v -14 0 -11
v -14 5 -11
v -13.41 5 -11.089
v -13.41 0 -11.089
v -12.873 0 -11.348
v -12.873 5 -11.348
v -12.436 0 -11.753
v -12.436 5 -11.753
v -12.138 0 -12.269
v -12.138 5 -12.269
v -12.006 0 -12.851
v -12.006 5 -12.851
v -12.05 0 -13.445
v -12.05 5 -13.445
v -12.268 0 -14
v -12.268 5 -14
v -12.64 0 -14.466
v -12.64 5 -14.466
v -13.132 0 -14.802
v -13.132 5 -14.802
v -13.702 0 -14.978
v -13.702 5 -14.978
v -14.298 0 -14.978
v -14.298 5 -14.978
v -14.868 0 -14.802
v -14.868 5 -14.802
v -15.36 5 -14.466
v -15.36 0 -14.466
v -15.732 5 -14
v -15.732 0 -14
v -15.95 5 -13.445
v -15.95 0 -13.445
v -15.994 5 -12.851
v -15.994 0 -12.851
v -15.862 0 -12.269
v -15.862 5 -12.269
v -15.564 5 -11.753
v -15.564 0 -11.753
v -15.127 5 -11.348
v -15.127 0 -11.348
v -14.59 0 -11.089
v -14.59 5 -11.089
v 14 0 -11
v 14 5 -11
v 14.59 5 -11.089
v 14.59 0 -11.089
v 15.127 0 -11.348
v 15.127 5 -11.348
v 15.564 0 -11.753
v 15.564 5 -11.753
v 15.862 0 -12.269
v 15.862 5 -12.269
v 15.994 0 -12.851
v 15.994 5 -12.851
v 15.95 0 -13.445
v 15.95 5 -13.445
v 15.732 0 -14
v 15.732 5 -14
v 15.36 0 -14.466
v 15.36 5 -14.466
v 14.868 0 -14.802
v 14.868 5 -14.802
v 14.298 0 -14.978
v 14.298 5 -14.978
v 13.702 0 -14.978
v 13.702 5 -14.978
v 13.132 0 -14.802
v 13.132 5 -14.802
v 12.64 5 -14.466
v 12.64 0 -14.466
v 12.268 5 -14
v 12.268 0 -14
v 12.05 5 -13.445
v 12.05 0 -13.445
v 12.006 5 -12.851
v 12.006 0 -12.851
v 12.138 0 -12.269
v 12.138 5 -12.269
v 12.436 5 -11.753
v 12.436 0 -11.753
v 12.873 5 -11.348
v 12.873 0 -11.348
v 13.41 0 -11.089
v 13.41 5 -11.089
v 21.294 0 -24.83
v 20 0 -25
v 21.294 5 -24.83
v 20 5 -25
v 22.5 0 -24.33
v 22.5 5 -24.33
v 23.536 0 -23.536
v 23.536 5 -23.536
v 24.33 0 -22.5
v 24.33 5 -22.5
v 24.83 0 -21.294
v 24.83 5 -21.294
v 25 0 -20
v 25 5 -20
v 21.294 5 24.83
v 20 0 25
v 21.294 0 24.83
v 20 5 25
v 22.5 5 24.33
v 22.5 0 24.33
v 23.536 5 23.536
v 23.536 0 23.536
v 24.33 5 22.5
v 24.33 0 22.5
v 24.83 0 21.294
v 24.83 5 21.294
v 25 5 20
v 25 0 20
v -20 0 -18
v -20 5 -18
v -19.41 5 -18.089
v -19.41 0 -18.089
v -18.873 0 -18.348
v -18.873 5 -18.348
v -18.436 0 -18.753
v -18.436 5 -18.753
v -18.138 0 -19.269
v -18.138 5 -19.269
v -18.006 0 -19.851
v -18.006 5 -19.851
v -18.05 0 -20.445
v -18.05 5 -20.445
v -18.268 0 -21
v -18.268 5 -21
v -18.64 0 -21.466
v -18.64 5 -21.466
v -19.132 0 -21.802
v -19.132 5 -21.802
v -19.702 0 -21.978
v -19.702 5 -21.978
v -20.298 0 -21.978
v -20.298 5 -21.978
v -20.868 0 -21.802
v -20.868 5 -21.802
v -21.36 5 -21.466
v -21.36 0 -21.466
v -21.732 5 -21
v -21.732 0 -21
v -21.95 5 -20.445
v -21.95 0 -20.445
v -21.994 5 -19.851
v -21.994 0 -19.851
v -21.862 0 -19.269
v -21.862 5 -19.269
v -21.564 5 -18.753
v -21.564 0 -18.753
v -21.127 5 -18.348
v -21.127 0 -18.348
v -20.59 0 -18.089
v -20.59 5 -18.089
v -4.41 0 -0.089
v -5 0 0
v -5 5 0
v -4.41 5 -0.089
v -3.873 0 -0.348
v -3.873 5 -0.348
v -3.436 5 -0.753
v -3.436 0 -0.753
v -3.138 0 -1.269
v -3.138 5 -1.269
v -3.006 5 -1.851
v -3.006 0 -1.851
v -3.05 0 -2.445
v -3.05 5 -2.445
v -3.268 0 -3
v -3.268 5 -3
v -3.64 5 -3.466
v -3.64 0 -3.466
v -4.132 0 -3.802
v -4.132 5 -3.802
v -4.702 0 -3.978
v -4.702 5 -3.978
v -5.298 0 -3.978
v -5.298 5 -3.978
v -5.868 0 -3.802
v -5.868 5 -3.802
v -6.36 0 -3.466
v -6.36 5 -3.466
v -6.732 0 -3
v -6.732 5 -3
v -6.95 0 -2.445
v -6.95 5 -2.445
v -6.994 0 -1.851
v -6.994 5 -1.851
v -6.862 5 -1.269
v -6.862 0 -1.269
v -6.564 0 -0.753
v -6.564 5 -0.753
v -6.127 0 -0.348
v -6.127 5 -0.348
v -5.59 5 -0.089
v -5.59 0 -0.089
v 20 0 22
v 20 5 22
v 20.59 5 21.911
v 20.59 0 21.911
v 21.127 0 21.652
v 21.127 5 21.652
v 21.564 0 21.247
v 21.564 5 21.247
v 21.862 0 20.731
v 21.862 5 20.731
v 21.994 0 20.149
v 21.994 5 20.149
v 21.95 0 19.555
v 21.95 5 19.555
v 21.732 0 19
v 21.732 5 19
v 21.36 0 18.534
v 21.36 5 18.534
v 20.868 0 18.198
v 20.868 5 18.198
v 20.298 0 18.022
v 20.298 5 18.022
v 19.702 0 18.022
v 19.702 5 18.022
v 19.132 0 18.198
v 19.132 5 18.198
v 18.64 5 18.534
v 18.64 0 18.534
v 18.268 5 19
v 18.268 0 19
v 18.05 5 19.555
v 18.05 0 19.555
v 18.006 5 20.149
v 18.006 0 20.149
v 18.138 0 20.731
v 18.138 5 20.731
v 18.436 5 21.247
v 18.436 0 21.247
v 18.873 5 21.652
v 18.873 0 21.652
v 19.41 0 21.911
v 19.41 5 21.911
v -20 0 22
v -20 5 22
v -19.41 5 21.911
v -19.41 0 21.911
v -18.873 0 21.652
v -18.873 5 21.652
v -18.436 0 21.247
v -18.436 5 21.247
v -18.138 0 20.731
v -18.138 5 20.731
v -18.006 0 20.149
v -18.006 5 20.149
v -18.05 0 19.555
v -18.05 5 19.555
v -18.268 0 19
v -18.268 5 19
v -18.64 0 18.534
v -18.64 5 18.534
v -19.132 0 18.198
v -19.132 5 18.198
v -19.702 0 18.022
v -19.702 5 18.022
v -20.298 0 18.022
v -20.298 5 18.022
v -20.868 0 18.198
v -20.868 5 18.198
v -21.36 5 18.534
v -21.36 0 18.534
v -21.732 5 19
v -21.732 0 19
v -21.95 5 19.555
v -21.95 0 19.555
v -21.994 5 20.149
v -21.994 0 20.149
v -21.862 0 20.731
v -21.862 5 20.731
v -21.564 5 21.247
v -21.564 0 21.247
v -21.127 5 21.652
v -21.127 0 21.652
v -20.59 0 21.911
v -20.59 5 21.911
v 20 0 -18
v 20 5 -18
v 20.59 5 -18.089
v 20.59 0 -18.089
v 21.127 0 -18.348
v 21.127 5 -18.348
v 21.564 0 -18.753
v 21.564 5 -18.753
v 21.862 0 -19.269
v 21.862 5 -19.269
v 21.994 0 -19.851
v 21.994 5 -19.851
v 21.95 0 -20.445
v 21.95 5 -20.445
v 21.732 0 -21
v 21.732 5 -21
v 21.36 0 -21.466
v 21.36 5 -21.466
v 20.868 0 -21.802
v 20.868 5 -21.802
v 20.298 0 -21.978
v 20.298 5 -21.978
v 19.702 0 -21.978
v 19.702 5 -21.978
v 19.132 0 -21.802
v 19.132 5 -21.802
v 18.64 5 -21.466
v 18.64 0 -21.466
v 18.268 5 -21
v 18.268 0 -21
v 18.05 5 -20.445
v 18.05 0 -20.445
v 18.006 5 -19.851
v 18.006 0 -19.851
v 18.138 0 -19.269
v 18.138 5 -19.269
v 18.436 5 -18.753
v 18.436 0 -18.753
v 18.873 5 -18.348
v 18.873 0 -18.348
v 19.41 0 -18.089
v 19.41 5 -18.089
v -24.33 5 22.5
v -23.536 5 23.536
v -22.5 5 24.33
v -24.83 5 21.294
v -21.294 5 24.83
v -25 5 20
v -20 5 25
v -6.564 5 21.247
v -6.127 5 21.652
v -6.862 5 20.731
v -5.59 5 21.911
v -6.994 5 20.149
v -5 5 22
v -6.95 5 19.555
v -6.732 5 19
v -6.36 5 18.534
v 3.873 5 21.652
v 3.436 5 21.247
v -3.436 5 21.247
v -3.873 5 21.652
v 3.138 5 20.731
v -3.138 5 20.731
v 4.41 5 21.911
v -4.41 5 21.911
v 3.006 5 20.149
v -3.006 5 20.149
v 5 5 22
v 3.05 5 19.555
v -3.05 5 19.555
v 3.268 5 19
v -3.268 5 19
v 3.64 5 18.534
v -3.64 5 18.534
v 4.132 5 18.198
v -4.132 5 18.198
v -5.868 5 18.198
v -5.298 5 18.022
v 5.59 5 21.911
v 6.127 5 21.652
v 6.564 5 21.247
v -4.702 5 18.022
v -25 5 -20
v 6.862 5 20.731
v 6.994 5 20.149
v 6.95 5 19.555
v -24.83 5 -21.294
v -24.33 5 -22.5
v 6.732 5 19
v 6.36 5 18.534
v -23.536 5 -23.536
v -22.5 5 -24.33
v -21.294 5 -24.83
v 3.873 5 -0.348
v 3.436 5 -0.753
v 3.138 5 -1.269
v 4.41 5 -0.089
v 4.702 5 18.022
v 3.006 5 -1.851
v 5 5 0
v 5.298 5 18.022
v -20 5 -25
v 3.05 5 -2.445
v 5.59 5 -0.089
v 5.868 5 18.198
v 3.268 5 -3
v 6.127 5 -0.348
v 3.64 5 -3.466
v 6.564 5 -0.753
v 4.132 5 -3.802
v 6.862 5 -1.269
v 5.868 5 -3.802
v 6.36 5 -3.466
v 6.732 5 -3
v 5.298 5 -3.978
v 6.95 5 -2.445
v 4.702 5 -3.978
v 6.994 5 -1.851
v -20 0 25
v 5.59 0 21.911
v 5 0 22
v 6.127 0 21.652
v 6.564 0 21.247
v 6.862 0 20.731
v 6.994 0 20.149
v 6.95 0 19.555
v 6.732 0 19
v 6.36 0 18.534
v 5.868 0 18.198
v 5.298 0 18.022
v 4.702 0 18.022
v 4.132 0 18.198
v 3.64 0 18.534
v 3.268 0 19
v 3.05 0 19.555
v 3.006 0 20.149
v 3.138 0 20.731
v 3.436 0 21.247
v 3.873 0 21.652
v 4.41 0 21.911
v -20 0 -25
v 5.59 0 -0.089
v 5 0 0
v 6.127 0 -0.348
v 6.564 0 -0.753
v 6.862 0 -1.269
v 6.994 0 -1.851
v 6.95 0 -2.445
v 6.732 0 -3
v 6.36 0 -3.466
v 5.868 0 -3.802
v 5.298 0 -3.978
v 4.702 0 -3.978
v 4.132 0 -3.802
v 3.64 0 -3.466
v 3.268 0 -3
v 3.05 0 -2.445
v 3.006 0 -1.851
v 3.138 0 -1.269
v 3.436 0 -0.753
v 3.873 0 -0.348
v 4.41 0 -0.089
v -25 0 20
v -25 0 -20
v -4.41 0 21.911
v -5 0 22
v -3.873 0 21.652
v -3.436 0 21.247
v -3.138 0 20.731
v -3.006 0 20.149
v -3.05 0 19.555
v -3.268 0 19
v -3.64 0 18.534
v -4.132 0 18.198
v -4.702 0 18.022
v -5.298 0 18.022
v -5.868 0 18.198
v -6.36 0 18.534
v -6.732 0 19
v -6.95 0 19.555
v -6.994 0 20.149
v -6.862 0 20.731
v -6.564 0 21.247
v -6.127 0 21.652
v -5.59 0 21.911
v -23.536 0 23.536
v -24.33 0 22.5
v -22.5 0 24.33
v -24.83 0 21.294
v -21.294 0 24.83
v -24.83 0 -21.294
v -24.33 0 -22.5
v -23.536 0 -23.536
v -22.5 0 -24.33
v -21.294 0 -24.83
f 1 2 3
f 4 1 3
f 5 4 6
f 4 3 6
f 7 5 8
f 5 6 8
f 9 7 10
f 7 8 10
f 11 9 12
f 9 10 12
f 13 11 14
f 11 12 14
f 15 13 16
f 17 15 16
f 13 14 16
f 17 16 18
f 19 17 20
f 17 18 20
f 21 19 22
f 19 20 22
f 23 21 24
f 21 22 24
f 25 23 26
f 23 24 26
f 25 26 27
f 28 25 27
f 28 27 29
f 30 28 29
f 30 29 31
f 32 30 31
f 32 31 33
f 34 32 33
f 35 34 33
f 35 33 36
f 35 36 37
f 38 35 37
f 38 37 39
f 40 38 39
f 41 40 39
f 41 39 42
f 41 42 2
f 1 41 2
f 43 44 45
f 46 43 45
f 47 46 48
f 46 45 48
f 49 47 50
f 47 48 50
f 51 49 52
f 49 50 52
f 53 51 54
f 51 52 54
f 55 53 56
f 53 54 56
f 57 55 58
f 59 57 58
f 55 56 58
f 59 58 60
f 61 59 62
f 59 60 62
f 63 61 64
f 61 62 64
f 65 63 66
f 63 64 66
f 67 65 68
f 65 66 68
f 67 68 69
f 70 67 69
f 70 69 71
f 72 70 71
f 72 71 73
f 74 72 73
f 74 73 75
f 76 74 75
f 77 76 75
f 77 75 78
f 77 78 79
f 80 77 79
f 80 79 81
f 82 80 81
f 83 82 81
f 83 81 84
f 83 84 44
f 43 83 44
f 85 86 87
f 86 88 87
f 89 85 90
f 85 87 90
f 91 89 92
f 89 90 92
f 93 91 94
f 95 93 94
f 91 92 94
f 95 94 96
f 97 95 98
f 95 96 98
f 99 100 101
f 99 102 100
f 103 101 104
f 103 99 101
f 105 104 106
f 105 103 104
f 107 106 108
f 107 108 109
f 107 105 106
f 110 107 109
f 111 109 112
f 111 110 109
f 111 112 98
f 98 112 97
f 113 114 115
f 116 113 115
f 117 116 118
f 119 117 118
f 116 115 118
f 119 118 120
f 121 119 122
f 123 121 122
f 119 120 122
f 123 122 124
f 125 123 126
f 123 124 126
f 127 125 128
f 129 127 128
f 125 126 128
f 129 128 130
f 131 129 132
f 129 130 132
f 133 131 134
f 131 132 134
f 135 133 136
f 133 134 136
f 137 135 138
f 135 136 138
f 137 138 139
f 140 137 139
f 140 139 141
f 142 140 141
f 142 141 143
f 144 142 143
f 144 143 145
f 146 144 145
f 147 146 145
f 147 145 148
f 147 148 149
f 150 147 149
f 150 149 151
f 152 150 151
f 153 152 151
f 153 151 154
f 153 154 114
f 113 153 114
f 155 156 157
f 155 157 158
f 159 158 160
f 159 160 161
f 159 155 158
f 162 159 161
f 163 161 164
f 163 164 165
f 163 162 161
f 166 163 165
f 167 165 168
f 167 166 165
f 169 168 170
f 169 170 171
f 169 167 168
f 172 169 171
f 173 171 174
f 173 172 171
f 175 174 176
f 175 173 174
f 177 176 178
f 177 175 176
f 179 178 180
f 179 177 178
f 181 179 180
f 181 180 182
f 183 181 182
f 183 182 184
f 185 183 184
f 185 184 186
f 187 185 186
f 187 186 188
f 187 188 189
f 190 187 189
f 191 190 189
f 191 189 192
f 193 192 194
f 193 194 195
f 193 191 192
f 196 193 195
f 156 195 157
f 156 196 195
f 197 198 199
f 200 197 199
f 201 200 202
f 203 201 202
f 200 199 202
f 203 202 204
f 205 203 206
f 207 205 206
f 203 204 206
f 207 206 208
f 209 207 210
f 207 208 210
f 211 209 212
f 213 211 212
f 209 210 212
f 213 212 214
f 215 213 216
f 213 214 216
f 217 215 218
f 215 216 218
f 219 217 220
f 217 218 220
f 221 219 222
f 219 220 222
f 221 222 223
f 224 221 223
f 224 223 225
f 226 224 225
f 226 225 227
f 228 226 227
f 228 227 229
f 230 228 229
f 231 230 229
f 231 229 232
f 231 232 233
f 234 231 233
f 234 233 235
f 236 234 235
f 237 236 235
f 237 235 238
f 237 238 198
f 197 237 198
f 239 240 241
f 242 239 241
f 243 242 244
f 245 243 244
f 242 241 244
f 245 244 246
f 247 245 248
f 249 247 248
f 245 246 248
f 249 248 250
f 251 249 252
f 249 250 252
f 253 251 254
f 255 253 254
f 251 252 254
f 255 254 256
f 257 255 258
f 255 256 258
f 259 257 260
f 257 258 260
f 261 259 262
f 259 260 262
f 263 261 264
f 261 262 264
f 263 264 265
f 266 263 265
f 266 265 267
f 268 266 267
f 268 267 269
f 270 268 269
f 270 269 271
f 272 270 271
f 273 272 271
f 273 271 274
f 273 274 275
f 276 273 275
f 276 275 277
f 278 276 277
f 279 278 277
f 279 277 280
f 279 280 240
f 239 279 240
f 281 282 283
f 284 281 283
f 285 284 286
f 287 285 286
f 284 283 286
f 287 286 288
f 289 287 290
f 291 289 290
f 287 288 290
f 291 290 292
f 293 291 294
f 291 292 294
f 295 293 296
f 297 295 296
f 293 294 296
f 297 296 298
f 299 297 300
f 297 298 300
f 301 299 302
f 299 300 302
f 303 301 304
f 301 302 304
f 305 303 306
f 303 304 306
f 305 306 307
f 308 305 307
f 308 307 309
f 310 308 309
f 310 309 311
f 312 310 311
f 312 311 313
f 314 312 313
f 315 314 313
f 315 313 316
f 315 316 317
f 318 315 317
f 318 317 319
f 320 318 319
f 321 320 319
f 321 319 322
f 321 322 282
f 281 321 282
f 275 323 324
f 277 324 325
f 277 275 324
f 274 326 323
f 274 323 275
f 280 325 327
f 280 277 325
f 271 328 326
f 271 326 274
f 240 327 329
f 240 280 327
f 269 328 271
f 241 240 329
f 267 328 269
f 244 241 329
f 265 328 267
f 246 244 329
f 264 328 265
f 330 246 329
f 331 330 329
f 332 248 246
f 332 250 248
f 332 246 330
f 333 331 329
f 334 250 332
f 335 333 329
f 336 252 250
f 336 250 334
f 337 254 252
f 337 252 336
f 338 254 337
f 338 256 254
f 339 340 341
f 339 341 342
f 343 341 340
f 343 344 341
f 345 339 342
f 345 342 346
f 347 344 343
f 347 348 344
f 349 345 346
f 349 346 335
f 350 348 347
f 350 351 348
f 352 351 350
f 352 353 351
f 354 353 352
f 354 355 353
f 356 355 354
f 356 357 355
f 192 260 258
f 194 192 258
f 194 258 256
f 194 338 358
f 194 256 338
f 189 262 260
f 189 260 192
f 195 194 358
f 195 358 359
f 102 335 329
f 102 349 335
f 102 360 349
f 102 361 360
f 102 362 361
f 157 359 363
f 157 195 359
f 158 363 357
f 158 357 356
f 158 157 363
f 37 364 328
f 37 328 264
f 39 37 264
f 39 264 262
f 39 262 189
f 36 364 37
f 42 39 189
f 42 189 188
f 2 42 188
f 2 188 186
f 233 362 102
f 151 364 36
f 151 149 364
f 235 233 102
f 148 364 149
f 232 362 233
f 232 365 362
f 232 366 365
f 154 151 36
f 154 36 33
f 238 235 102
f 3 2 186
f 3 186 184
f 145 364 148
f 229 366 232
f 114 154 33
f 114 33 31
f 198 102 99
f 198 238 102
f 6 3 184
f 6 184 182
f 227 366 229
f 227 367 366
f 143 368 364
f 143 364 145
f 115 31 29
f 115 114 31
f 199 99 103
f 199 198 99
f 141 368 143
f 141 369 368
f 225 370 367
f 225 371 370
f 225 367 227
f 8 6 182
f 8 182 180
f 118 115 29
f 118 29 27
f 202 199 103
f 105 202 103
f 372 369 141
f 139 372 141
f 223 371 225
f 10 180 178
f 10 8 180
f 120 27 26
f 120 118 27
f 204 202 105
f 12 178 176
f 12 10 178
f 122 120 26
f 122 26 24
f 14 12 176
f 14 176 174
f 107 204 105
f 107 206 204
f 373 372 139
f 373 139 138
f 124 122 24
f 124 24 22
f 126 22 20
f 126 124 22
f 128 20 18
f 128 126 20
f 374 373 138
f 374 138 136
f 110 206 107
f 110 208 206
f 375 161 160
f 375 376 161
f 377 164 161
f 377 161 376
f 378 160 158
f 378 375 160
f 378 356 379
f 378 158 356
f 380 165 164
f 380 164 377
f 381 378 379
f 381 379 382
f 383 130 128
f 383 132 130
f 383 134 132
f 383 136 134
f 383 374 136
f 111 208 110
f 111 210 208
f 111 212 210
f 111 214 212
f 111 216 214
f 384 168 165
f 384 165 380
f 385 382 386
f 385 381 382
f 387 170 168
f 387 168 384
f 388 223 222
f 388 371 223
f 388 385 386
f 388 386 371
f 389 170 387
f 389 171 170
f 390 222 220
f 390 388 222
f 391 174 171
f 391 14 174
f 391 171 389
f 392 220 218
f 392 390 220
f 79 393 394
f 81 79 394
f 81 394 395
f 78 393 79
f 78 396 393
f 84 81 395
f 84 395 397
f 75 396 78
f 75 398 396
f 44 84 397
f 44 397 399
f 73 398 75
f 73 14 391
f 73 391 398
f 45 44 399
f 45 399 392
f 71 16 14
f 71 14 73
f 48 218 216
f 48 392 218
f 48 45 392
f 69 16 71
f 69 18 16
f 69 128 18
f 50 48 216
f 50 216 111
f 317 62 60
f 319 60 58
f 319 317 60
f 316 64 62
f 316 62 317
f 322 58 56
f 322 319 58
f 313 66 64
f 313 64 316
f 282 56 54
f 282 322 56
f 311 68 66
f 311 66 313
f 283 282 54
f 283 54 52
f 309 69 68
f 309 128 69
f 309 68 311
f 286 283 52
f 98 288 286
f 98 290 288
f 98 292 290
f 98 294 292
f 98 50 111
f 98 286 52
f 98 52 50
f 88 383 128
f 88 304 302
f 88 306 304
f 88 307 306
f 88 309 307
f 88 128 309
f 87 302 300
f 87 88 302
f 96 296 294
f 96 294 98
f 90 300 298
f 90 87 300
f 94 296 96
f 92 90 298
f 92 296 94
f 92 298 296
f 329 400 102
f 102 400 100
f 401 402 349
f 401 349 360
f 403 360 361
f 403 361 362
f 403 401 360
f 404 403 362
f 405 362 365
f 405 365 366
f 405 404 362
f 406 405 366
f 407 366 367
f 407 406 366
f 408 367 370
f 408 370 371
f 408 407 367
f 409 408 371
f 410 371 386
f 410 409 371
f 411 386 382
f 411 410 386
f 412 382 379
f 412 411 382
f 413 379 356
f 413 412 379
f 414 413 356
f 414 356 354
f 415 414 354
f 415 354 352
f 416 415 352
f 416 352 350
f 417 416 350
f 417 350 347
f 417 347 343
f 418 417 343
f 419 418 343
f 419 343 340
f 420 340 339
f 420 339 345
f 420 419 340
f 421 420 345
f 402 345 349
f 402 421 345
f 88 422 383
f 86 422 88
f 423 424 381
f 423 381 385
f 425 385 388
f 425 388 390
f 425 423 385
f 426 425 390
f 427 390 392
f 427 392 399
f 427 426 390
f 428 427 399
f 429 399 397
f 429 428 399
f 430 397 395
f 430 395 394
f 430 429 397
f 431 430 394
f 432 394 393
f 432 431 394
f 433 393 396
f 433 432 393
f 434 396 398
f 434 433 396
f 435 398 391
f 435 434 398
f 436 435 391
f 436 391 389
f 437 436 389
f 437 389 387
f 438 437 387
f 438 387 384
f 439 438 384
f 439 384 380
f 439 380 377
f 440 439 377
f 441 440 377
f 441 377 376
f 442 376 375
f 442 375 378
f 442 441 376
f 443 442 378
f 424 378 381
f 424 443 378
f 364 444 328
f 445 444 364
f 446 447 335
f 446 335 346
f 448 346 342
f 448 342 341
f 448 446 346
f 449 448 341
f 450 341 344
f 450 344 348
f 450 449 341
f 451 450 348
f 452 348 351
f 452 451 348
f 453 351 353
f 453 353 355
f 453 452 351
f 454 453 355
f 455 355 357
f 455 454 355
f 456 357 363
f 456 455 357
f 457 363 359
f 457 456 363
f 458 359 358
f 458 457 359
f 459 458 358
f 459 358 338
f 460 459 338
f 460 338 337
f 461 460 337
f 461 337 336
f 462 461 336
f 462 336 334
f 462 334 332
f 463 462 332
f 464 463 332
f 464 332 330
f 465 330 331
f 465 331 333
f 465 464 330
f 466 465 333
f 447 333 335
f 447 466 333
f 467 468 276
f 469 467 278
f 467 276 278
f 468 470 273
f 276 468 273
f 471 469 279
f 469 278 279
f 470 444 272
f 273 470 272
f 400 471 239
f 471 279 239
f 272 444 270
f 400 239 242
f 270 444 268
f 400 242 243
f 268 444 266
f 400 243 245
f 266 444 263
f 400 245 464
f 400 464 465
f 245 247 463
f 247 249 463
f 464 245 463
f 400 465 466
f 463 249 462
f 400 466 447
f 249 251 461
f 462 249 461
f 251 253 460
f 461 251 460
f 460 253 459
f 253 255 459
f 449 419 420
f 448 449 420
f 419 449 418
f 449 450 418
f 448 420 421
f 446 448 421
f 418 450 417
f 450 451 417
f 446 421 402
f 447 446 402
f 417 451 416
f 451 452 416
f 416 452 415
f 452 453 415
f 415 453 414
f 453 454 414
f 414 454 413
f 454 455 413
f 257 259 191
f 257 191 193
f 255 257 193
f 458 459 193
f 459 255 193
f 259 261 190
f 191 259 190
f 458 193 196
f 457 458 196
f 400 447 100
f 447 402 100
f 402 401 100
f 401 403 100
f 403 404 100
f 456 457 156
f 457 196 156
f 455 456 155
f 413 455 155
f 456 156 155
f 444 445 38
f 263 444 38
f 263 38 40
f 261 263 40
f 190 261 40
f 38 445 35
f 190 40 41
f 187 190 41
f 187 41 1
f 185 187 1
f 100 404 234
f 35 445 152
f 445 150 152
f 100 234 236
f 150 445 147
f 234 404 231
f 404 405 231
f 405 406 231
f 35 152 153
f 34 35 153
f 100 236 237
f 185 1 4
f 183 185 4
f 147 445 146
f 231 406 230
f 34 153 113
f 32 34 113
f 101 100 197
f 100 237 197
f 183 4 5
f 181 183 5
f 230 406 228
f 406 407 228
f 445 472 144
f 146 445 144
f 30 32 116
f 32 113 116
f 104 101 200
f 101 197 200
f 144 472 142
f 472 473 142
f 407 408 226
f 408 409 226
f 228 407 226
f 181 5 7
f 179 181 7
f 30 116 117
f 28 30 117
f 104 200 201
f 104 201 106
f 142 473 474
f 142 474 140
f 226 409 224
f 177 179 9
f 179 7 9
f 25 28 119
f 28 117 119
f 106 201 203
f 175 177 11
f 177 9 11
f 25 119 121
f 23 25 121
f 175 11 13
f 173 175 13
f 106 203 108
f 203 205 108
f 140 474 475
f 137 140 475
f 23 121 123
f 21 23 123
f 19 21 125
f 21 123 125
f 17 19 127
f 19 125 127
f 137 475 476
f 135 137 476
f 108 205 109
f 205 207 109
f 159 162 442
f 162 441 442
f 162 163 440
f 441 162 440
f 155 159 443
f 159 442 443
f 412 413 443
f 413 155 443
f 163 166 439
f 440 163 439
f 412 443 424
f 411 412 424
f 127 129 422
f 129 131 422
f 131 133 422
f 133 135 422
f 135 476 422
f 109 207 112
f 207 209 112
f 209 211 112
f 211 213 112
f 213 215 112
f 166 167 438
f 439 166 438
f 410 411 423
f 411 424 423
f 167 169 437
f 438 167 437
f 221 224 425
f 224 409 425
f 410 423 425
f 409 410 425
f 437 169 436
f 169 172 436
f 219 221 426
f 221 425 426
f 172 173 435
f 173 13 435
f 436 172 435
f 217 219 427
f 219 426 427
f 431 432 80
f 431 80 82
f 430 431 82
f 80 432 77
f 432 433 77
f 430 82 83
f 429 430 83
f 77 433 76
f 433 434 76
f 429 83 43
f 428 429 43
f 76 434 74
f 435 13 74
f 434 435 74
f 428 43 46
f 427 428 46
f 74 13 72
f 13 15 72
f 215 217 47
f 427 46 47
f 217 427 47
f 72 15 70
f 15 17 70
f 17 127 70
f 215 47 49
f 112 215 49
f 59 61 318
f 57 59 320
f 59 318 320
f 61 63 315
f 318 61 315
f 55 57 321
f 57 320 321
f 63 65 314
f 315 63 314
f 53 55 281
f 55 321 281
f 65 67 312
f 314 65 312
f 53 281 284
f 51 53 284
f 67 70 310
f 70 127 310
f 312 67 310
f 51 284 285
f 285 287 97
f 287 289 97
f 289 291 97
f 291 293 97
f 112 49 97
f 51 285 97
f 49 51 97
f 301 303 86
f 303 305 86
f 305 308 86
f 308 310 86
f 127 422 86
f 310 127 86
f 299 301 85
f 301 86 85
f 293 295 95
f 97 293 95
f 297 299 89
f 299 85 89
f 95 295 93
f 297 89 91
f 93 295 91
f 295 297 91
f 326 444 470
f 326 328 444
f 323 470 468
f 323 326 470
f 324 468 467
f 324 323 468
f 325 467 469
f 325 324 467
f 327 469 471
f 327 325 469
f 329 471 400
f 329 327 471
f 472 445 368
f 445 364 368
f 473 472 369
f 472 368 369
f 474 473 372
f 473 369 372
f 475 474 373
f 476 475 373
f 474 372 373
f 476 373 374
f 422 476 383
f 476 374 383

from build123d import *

# Parameters (mm, degrees)
ESQUISSE1_W             = 50
ESQUISSE1_H             = 50
ESQUISSE1_R             = 2
BOSS_EXTRU_1_DEPTH      = 5
CONG_1_R                = 5
ESQUISSE2_R             = 2
ENL_V_MAT_EXTRU_1_DEPTH = 10


with BuildPart() as part:
    # Esquisse1 → Boss.-Extru.1 (new body)
    with BuildSketch(Plane(origin=(0, 0, 0), x_dir=(1, 0, 0), z_dir=(0, 1, 0))):
        Rectangle(ESQUISSE1_W, ESQUISSE1_H)
        with Locations(Location((-5, -20, 0), (0, 0, 270))):
            Circle(ESQUISSE1_R, mode=Mode.SUBTRACT)
        with Locations(Location((5, -20, 0), (0, 0, 270))):
            Circle(ESQUISSE1_R, mode=Mode.SUBTRACT)
        with Locations(Location((-5, 2, 0), (0, 0, 270))):
            Circle(ESQUISSE1_R, mode=Mode.SUBTRACT)
        with Locations(Location((5, 2, 0), (0, 0, 270))):
            Circle(ESQUISSE1_R, mode=Mode.SUBTRACT)
    extrude(amount=BOSS_EXTRU_1_DEPTH)

    # Congé1
    cong_1_edges = [part.edges().sort_by_distance(p)[0] for p in [
        (-25, 2.5, -25),
        (25, 2.5, -25),
        (25, 2.5, 25),
        (-25, 2.5, 25),
    ]]
    fillet(cong_1_edges, radius=CONG_1_R)

    # Esquisse2 → Enlèv. mat.-Extru.1 (cut)
    with BuildSketch(Plane(origin=(0, 5, 0), x_dir=(1, 0, 0), z_dir=(0, 1, 0))):
        with Locations(Location((-20, 20, 0), (0, 0, 270))):
            Circle(ESQUISSE2_R)
        with Locations(Location((-20, -20, 0), (0, 0, 270))):
            Circle(ESQUISSE2_R)
        with Locations(Location((20, -20, 0), (0, 0, 270))):
            Circle(ESQUISSE2_R)
        with Locations(Location((20, 20, 0), (0, 0, 270))):
            Circle(ESQUISSE2_R)
        with Locations(Location((-14, 13, 0), (0, 0, 270))):
            Circle(ESQUISSE2_R)
        with Locations(Location((14, 13, 0), (0, 0, 270))):
            Circle(ESQUISSE2_R)
    extrude(amount=-ENL_V_MAT_EXTRU_1_DEPTH, mode=Mode.SUBTRACT)


solid = part.part
